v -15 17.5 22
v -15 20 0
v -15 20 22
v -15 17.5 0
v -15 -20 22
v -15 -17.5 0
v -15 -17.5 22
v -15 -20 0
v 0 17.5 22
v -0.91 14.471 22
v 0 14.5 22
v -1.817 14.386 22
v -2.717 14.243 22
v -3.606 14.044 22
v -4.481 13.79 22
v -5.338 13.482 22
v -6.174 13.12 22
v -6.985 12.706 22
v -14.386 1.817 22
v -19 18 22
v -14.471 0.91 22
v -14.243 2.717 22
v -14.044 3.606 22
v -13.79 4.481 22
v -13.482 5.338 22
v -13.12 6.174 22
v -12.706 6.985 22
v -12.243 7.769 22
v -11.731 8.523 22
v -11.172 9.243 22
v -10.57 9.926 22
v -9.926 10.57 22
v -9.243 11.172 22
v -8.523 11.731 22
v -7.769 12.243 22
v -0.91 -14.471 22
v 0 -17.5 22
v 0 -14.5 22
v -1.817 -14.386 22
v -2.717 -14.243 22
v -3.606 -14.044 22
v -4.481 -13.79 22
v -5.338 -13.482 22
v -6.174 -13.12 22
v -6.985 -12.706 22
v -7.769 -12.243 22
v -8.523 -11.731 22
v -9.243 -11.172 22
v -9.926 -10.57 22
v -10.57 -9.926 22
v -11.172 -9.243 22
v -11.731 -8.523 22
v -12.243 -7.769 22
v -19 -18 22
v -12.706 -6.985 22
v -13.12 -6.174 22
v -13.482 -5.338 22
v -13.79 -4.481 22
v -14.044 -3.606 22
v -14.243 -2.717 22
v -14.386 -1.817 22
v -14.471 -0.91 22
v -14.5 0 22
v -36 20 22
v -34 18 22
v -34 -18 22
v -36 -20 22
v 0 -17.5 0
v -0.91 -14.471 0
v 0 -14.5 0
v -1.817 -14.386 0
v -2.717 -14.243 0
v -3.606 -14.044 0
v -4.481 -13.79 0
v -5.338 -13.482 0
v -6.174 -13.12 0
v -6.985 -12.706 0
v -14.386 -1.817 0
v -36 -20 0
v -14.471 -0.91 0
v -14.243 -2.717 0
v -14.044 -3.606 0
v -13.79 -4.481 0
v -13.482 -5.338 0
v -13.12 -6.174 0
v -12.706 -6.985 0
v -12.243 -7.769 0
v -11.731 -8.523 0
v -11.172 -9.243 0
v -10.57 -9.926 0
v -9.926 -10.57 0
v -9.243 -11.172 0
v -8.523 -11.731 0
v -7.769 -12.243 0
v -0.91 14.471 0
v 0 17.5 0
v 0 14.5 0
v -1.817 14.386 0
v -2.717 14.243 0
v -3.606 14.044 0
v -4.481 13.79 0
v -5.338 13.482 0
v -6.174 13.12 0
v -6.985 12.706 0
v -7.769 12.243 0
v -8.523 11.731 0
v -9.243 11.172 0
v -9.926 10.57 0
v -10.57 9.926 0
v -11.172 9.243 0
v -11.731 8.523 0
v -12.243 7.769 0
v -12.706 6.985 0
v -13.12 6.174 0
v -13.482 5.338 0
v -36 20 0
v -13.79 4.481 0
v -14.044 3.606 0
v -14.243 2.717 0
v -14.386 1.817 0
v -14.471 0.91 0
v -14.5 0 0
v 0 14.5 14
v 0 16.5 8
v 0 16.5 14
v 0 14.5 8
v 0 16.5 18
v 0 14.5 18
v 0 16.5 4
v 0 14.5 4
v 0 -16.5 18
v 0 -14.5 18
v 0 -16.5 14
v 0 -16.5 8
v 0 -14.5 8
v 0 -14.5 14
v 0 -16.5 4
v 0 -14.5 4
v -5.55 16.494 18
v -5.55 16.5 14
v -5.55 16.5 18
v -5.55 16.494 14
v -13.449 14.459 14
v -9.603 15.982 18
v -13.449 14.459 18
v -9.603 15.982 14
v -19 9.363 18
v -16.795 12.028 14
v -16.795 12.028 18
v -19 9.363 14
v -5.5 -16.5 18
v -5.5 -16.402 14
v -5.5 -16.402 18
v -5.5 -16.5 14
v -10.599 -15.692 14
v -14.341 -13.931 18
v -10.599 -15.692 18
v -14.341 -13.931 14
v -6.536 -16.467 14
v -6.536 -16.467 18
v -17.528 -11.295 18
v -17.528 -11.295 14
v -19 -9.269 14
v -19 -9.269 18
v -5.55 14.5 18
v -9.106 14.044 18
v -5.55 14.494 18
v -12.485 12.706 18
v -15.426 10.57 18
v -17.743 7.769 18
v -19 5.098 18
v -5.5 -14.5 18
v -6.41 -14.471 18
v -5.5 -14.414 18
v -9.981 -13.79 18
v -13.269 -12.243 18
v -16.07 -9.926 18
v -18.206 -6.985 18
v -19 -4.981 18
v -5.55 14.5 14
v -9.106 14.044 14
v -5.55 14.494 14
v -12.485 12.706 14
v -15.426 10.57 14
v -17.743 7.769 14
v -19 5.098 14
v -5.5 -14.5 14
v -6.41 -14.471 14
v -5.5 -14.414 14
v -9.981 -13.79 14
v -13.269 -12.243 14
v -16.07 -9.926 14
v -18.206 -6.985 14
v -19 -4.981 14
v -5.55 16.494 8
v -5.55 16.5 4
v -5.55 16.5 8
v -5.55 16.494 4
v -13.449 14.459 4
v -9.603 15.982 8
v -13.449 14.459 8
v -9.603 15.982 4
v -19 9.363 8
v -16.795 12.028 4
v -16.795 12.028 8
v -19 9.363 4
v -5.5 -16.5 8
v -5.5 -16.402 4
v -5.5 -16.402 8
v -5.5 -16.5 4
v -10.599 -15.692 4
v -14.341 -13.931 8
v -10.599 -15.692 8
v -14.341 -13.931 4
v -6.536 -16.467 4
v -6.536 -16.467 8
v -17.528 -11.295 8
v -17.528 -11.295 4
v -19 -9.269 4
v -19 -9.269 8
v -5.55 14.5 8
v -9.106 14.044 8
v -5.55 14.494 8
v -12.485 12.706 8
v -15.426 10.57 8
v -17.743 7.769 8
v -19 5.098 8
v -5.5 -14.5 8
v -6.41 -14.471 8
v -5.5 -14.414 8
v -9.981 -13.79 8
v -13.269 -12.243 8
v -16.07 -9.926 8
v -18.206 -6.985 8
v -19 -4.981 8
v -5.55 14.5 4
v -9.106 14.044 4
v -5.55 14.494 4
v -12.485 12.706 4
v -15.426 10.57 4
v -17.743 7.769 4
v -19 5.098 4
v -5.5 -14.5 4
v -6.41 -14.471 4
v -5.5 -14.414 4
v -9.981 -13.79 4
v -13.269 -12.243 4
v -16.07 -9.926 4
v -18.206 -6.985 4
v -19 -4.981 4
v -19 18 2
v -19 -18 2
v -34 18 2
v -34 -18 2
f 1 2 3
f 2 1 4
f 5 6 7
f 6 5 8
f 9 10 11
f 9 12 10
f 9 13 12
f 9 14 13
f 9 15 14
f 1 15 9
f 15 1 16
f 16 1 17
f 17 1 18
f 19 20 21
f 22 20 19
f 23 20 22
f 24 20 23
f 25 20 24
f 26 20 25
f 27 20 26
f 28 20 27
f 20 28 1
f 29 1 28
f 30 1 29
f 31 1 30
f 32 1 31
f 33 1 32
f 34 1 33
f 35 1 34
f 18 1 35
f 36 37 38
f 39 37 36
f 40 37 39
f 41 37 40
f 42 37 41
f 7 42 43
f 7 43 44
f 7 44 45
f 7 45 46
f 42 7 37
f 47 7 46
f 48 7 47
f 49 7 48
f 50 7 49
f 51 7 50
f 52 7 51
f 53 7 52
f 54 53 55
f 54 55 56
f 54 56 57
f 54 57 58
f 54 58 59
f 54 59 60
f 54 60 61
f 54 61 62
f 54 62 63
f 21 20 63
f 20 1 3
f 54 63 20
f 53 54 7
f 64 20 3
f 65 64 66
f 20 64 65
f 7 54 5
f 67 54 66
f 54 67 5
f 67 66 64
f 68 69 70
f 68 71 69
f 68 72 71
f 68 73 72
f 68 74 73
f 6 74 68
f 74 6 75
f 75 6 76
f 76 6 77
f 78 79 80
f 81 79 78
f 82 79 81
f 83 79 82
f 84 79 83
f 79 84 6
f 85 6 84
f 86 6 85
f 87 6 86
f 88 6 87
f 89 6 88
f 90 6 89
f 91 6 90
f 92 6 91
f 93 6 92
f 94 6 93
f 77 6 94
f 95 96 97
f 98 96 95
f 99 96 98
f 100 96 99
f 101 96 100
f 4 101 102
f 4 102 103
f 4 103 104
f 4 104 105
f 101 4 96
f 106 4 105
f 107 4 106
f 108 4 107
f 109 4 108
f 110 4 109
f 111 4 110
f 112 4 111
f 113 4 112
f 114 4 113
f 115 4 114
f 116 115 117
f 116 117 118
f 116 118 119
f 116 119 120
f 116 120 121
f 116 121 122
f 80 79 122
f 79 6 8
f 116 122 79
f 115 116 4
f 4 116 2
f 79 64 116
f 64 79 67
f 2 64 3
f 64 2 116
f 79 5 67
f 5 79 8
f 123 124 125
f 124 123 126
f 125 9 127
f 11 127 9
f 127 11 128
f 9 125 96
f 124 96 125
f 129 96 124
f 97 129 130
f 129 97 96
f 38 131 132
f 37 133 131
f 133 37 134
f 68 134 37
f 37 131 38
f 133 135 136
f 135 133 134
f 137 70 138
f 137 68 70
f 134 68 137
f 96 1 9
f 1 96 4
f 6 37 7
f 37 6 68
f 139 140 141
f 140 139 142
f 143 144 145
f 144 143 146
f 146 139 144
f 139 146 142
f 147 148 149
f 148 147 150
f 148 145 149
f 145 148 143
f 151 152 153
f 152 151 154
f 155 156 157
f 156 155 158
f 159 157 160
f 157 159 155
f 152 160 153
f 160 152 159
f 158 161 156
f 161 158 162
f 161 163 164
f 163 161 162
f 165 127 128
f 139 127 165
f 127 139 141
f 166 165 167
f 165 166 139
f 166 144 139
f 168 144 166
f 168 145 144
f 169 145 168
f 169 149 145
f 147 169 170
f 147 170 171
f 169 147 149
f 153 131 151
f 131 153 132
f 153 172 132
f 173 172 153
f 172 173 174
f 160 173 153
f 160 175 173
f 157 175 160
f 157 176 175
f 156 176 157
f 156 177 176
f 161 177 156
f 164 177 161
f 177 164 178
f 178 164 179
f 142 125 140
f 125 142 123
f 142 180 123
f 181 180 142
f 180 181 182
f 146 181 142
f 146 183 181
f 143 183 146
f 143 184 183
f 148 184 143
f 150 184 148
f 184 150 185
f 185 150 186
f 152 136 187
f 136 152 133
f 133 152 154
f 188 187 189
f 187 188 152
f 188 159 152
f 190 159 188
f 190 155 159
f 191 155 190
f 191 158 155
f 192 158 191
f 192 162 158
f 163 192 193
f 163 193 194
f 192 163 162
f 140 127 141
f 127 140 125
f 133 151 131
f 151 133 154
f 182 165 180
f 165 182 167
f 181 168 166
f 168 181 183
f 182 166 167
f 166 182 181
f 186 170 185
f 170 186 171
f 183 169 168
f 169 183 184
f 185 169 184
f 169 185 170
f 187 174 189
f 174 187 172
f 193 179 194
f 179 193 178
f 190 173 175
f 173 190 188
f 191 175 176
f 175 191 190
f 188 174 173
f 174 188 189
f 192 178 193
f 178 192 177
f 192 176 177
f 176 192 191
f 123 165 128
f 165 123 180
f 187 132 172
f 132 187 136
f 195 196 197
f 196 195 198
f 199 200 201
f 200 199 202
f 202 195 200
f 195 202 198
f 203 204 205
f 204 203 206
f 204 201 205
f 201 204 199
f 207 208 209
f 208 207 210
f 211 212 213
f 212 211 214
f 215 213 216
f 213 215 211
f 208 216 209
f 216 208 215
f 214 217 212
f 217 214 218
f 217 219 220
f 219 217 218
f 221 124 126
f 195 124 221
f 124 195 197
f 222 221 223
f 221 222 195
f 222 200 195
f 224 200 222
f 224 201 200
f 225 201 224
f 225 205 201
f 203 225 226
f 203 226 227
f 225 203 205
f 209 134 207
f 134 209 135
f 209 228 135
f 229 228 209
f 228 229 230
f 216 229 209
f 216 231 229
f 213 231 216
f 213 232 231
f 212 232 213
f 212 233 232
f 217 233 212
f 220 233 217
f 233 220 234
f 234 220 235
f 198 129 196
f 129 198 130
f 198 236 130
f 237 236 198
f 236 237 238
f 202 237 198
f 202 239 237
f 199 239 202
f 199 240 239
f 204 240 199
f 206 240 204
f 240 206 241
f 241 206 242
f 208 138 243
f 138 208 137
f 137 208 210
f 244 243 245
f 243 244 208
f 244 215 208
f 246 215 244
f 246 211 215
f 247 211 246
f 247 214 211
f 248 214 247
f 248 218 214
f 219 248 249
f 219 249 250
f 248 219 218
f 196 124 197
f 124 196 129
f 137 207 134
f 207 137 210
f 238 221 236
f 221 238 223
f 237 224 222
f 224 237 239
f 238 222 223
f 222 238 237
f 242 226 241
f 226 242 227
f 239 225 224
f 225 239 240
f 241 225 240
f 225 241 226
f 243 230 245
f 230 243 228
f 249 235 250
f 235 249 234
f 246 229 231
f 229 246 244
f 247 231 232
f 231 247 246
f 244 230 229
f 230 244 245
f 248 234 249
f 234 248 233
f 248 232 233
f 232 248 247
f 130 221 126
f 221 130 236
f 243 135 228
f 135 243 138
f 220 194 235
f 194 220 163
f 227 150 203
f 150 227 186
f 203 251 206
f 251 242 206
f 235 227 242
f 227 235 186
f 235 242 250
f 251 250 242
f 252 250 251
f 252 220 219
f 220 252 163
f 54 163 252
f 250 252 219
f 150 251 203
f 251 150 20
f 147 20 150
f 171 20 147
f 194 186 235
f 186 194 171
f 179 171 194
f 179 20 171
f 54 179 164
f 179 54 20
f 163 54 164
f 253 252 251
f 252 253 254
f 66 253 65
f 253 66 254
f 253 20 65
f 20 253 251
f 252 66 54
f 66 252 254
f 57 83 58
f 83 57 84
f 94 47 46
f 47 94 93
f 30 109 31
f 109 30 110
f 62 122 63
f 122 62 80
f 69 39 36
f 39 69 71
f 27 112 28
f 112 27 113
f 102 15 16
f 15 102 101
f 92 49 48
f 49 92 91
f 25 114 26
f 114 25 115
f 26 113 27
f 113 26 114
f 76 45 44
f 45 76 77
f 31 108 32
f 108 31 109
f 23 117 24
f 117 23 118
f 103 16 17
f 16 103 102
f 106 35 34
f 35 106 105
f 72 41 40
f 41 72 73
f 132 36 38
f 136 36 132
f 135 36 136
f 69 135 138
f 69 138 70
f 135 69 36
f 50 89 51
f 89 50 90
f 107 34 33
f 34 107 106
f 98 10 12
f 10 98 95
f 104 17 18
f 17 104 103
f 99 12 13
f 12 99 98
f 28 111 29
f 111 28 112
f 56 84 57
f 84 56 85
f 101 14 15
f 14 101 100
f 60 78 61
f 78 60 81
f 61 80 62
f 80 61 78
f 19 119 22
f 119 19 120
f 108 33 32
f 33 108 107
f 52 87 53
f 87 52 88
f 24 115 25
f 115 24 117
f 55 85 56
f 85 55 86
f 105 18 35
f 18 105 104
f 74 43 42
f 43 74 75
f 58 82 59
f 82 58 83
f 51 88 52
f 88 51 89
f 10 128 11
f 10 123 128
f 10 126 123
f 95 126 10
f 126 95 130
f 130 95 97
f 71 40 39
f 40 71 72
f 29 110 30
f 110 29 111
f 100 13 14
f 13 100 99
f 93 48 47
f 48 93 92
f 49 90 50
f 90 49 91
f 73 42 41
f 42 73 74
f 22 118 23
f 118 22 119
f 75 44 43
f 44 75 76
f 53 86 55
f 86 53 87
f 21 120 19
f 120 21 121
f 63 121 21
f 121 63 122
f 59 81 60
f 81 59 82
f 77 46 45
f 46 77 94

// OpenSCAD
// file: roundCornersCube.scad
/*
http://codeviewer.org/view/code:1b36 
Copyright (C) 2011 Sergio Vilches
This program is free software: you can redistribute it and/or modify it under the terms of the GNU General Public License as published by the Free Software Foundation, either version 3 of the License, or (at your option) any later version.
This program is distributed in the hope that it will be useful, but WITHOUT ANY WARRANTY; without even the implied warranty of MERCHANTABILITY or FITNESS FOR A PARTICULAR PURPOSE. See the GNU General Public License for more details. You should have received a copy of the GNU General Public License along with this program. If not, see <http://www.gnu.org/licenses/>.
Contact: s.vilches.e@gmail.com


    ----------------------------------------------------------- 
                 Round Corners Cube (Extruded)                
      roundCornersCube(x,y,z,r) Where:                        
         - x = Xdir width                                     
         - y = Ydir width                                     
         - z = Height of the cube                             
         - r = Rounding radious                               
                                                              
      Example: roundCornerCube(10,10,2,1);                    
     *Some times it's needed to use F6 to see good results!   
 	 ----------------------------------------------------------- 
*/
// Test it!
// roundCornersCube(10,5,2,1);


module createMeniscus(h,radius) // This module creates the shape that needs to be substracted from a cube to make its corners rounded.
difference(){        //This shape is basicly the difference between a quarter of cylinder and a cube
   translate([radius/2+0.1,radius/2+0.1,0]){
      cube([radius+0.2,radius+0.1,h+0.2],center=true);         // All that 0.x numbers are to avoid "ghost boundaries" when substracting
   }

   cylinder(h=h+0.2,r=radius,$fn = 25,center=true);
}


module roundCornersCube(x,y,z,r)  // Now we just substract the shape we have created in the four corners
difference(){
   cube([x,y,z], center=true);

translate([x/2-r,y/2-r]){  // We move to the first corner (x,y)
      rotate(0){  
         createMeniscus(z,r); // And substract the meniscus
      }
   }
   translate([-x/2+r,y/2-r]){ // To the second corner (-x,y)
      rotate(90){
         createMeniscus(z,r); // But this time we have to rotate the meniscus 90 deg
      }
   }
      translate([-x/2+r,-y/2+r]){ // ... 
      rotate(180){
         createMeniscus(z,r);
      }
   }
      translate([x/2-r,-y/2+r]){
      rotate(270){
         createMeniscus(z,r);
      }
   }
}

module rrc(x,y,z,r) {
   translate([x/2,y/2,z/2])
   roundCornersCube(x,y,z,r);
}
// main file
include <roundCornersCube.scad>

difference() {

union() {
translate([-36,-20,0])
cube([21,40,22]);
translate([-21,-17.5,0])
cube([21,35,22]);
}

translate([-34,-18,2])
cube([15,36,21]);

cylinder($fn=100, 30,14.5,14.5);

translate([0,0,16])
difference() {
roundCornersCube(44,33,4,16.5);
roundCornersCube(40,29,4,14.5);
}

translate([0,0,6])
difference() {
roundCornersCube(44,33,4,16.5);
roundCornersCube(40,29,4,14.5);
}

}
